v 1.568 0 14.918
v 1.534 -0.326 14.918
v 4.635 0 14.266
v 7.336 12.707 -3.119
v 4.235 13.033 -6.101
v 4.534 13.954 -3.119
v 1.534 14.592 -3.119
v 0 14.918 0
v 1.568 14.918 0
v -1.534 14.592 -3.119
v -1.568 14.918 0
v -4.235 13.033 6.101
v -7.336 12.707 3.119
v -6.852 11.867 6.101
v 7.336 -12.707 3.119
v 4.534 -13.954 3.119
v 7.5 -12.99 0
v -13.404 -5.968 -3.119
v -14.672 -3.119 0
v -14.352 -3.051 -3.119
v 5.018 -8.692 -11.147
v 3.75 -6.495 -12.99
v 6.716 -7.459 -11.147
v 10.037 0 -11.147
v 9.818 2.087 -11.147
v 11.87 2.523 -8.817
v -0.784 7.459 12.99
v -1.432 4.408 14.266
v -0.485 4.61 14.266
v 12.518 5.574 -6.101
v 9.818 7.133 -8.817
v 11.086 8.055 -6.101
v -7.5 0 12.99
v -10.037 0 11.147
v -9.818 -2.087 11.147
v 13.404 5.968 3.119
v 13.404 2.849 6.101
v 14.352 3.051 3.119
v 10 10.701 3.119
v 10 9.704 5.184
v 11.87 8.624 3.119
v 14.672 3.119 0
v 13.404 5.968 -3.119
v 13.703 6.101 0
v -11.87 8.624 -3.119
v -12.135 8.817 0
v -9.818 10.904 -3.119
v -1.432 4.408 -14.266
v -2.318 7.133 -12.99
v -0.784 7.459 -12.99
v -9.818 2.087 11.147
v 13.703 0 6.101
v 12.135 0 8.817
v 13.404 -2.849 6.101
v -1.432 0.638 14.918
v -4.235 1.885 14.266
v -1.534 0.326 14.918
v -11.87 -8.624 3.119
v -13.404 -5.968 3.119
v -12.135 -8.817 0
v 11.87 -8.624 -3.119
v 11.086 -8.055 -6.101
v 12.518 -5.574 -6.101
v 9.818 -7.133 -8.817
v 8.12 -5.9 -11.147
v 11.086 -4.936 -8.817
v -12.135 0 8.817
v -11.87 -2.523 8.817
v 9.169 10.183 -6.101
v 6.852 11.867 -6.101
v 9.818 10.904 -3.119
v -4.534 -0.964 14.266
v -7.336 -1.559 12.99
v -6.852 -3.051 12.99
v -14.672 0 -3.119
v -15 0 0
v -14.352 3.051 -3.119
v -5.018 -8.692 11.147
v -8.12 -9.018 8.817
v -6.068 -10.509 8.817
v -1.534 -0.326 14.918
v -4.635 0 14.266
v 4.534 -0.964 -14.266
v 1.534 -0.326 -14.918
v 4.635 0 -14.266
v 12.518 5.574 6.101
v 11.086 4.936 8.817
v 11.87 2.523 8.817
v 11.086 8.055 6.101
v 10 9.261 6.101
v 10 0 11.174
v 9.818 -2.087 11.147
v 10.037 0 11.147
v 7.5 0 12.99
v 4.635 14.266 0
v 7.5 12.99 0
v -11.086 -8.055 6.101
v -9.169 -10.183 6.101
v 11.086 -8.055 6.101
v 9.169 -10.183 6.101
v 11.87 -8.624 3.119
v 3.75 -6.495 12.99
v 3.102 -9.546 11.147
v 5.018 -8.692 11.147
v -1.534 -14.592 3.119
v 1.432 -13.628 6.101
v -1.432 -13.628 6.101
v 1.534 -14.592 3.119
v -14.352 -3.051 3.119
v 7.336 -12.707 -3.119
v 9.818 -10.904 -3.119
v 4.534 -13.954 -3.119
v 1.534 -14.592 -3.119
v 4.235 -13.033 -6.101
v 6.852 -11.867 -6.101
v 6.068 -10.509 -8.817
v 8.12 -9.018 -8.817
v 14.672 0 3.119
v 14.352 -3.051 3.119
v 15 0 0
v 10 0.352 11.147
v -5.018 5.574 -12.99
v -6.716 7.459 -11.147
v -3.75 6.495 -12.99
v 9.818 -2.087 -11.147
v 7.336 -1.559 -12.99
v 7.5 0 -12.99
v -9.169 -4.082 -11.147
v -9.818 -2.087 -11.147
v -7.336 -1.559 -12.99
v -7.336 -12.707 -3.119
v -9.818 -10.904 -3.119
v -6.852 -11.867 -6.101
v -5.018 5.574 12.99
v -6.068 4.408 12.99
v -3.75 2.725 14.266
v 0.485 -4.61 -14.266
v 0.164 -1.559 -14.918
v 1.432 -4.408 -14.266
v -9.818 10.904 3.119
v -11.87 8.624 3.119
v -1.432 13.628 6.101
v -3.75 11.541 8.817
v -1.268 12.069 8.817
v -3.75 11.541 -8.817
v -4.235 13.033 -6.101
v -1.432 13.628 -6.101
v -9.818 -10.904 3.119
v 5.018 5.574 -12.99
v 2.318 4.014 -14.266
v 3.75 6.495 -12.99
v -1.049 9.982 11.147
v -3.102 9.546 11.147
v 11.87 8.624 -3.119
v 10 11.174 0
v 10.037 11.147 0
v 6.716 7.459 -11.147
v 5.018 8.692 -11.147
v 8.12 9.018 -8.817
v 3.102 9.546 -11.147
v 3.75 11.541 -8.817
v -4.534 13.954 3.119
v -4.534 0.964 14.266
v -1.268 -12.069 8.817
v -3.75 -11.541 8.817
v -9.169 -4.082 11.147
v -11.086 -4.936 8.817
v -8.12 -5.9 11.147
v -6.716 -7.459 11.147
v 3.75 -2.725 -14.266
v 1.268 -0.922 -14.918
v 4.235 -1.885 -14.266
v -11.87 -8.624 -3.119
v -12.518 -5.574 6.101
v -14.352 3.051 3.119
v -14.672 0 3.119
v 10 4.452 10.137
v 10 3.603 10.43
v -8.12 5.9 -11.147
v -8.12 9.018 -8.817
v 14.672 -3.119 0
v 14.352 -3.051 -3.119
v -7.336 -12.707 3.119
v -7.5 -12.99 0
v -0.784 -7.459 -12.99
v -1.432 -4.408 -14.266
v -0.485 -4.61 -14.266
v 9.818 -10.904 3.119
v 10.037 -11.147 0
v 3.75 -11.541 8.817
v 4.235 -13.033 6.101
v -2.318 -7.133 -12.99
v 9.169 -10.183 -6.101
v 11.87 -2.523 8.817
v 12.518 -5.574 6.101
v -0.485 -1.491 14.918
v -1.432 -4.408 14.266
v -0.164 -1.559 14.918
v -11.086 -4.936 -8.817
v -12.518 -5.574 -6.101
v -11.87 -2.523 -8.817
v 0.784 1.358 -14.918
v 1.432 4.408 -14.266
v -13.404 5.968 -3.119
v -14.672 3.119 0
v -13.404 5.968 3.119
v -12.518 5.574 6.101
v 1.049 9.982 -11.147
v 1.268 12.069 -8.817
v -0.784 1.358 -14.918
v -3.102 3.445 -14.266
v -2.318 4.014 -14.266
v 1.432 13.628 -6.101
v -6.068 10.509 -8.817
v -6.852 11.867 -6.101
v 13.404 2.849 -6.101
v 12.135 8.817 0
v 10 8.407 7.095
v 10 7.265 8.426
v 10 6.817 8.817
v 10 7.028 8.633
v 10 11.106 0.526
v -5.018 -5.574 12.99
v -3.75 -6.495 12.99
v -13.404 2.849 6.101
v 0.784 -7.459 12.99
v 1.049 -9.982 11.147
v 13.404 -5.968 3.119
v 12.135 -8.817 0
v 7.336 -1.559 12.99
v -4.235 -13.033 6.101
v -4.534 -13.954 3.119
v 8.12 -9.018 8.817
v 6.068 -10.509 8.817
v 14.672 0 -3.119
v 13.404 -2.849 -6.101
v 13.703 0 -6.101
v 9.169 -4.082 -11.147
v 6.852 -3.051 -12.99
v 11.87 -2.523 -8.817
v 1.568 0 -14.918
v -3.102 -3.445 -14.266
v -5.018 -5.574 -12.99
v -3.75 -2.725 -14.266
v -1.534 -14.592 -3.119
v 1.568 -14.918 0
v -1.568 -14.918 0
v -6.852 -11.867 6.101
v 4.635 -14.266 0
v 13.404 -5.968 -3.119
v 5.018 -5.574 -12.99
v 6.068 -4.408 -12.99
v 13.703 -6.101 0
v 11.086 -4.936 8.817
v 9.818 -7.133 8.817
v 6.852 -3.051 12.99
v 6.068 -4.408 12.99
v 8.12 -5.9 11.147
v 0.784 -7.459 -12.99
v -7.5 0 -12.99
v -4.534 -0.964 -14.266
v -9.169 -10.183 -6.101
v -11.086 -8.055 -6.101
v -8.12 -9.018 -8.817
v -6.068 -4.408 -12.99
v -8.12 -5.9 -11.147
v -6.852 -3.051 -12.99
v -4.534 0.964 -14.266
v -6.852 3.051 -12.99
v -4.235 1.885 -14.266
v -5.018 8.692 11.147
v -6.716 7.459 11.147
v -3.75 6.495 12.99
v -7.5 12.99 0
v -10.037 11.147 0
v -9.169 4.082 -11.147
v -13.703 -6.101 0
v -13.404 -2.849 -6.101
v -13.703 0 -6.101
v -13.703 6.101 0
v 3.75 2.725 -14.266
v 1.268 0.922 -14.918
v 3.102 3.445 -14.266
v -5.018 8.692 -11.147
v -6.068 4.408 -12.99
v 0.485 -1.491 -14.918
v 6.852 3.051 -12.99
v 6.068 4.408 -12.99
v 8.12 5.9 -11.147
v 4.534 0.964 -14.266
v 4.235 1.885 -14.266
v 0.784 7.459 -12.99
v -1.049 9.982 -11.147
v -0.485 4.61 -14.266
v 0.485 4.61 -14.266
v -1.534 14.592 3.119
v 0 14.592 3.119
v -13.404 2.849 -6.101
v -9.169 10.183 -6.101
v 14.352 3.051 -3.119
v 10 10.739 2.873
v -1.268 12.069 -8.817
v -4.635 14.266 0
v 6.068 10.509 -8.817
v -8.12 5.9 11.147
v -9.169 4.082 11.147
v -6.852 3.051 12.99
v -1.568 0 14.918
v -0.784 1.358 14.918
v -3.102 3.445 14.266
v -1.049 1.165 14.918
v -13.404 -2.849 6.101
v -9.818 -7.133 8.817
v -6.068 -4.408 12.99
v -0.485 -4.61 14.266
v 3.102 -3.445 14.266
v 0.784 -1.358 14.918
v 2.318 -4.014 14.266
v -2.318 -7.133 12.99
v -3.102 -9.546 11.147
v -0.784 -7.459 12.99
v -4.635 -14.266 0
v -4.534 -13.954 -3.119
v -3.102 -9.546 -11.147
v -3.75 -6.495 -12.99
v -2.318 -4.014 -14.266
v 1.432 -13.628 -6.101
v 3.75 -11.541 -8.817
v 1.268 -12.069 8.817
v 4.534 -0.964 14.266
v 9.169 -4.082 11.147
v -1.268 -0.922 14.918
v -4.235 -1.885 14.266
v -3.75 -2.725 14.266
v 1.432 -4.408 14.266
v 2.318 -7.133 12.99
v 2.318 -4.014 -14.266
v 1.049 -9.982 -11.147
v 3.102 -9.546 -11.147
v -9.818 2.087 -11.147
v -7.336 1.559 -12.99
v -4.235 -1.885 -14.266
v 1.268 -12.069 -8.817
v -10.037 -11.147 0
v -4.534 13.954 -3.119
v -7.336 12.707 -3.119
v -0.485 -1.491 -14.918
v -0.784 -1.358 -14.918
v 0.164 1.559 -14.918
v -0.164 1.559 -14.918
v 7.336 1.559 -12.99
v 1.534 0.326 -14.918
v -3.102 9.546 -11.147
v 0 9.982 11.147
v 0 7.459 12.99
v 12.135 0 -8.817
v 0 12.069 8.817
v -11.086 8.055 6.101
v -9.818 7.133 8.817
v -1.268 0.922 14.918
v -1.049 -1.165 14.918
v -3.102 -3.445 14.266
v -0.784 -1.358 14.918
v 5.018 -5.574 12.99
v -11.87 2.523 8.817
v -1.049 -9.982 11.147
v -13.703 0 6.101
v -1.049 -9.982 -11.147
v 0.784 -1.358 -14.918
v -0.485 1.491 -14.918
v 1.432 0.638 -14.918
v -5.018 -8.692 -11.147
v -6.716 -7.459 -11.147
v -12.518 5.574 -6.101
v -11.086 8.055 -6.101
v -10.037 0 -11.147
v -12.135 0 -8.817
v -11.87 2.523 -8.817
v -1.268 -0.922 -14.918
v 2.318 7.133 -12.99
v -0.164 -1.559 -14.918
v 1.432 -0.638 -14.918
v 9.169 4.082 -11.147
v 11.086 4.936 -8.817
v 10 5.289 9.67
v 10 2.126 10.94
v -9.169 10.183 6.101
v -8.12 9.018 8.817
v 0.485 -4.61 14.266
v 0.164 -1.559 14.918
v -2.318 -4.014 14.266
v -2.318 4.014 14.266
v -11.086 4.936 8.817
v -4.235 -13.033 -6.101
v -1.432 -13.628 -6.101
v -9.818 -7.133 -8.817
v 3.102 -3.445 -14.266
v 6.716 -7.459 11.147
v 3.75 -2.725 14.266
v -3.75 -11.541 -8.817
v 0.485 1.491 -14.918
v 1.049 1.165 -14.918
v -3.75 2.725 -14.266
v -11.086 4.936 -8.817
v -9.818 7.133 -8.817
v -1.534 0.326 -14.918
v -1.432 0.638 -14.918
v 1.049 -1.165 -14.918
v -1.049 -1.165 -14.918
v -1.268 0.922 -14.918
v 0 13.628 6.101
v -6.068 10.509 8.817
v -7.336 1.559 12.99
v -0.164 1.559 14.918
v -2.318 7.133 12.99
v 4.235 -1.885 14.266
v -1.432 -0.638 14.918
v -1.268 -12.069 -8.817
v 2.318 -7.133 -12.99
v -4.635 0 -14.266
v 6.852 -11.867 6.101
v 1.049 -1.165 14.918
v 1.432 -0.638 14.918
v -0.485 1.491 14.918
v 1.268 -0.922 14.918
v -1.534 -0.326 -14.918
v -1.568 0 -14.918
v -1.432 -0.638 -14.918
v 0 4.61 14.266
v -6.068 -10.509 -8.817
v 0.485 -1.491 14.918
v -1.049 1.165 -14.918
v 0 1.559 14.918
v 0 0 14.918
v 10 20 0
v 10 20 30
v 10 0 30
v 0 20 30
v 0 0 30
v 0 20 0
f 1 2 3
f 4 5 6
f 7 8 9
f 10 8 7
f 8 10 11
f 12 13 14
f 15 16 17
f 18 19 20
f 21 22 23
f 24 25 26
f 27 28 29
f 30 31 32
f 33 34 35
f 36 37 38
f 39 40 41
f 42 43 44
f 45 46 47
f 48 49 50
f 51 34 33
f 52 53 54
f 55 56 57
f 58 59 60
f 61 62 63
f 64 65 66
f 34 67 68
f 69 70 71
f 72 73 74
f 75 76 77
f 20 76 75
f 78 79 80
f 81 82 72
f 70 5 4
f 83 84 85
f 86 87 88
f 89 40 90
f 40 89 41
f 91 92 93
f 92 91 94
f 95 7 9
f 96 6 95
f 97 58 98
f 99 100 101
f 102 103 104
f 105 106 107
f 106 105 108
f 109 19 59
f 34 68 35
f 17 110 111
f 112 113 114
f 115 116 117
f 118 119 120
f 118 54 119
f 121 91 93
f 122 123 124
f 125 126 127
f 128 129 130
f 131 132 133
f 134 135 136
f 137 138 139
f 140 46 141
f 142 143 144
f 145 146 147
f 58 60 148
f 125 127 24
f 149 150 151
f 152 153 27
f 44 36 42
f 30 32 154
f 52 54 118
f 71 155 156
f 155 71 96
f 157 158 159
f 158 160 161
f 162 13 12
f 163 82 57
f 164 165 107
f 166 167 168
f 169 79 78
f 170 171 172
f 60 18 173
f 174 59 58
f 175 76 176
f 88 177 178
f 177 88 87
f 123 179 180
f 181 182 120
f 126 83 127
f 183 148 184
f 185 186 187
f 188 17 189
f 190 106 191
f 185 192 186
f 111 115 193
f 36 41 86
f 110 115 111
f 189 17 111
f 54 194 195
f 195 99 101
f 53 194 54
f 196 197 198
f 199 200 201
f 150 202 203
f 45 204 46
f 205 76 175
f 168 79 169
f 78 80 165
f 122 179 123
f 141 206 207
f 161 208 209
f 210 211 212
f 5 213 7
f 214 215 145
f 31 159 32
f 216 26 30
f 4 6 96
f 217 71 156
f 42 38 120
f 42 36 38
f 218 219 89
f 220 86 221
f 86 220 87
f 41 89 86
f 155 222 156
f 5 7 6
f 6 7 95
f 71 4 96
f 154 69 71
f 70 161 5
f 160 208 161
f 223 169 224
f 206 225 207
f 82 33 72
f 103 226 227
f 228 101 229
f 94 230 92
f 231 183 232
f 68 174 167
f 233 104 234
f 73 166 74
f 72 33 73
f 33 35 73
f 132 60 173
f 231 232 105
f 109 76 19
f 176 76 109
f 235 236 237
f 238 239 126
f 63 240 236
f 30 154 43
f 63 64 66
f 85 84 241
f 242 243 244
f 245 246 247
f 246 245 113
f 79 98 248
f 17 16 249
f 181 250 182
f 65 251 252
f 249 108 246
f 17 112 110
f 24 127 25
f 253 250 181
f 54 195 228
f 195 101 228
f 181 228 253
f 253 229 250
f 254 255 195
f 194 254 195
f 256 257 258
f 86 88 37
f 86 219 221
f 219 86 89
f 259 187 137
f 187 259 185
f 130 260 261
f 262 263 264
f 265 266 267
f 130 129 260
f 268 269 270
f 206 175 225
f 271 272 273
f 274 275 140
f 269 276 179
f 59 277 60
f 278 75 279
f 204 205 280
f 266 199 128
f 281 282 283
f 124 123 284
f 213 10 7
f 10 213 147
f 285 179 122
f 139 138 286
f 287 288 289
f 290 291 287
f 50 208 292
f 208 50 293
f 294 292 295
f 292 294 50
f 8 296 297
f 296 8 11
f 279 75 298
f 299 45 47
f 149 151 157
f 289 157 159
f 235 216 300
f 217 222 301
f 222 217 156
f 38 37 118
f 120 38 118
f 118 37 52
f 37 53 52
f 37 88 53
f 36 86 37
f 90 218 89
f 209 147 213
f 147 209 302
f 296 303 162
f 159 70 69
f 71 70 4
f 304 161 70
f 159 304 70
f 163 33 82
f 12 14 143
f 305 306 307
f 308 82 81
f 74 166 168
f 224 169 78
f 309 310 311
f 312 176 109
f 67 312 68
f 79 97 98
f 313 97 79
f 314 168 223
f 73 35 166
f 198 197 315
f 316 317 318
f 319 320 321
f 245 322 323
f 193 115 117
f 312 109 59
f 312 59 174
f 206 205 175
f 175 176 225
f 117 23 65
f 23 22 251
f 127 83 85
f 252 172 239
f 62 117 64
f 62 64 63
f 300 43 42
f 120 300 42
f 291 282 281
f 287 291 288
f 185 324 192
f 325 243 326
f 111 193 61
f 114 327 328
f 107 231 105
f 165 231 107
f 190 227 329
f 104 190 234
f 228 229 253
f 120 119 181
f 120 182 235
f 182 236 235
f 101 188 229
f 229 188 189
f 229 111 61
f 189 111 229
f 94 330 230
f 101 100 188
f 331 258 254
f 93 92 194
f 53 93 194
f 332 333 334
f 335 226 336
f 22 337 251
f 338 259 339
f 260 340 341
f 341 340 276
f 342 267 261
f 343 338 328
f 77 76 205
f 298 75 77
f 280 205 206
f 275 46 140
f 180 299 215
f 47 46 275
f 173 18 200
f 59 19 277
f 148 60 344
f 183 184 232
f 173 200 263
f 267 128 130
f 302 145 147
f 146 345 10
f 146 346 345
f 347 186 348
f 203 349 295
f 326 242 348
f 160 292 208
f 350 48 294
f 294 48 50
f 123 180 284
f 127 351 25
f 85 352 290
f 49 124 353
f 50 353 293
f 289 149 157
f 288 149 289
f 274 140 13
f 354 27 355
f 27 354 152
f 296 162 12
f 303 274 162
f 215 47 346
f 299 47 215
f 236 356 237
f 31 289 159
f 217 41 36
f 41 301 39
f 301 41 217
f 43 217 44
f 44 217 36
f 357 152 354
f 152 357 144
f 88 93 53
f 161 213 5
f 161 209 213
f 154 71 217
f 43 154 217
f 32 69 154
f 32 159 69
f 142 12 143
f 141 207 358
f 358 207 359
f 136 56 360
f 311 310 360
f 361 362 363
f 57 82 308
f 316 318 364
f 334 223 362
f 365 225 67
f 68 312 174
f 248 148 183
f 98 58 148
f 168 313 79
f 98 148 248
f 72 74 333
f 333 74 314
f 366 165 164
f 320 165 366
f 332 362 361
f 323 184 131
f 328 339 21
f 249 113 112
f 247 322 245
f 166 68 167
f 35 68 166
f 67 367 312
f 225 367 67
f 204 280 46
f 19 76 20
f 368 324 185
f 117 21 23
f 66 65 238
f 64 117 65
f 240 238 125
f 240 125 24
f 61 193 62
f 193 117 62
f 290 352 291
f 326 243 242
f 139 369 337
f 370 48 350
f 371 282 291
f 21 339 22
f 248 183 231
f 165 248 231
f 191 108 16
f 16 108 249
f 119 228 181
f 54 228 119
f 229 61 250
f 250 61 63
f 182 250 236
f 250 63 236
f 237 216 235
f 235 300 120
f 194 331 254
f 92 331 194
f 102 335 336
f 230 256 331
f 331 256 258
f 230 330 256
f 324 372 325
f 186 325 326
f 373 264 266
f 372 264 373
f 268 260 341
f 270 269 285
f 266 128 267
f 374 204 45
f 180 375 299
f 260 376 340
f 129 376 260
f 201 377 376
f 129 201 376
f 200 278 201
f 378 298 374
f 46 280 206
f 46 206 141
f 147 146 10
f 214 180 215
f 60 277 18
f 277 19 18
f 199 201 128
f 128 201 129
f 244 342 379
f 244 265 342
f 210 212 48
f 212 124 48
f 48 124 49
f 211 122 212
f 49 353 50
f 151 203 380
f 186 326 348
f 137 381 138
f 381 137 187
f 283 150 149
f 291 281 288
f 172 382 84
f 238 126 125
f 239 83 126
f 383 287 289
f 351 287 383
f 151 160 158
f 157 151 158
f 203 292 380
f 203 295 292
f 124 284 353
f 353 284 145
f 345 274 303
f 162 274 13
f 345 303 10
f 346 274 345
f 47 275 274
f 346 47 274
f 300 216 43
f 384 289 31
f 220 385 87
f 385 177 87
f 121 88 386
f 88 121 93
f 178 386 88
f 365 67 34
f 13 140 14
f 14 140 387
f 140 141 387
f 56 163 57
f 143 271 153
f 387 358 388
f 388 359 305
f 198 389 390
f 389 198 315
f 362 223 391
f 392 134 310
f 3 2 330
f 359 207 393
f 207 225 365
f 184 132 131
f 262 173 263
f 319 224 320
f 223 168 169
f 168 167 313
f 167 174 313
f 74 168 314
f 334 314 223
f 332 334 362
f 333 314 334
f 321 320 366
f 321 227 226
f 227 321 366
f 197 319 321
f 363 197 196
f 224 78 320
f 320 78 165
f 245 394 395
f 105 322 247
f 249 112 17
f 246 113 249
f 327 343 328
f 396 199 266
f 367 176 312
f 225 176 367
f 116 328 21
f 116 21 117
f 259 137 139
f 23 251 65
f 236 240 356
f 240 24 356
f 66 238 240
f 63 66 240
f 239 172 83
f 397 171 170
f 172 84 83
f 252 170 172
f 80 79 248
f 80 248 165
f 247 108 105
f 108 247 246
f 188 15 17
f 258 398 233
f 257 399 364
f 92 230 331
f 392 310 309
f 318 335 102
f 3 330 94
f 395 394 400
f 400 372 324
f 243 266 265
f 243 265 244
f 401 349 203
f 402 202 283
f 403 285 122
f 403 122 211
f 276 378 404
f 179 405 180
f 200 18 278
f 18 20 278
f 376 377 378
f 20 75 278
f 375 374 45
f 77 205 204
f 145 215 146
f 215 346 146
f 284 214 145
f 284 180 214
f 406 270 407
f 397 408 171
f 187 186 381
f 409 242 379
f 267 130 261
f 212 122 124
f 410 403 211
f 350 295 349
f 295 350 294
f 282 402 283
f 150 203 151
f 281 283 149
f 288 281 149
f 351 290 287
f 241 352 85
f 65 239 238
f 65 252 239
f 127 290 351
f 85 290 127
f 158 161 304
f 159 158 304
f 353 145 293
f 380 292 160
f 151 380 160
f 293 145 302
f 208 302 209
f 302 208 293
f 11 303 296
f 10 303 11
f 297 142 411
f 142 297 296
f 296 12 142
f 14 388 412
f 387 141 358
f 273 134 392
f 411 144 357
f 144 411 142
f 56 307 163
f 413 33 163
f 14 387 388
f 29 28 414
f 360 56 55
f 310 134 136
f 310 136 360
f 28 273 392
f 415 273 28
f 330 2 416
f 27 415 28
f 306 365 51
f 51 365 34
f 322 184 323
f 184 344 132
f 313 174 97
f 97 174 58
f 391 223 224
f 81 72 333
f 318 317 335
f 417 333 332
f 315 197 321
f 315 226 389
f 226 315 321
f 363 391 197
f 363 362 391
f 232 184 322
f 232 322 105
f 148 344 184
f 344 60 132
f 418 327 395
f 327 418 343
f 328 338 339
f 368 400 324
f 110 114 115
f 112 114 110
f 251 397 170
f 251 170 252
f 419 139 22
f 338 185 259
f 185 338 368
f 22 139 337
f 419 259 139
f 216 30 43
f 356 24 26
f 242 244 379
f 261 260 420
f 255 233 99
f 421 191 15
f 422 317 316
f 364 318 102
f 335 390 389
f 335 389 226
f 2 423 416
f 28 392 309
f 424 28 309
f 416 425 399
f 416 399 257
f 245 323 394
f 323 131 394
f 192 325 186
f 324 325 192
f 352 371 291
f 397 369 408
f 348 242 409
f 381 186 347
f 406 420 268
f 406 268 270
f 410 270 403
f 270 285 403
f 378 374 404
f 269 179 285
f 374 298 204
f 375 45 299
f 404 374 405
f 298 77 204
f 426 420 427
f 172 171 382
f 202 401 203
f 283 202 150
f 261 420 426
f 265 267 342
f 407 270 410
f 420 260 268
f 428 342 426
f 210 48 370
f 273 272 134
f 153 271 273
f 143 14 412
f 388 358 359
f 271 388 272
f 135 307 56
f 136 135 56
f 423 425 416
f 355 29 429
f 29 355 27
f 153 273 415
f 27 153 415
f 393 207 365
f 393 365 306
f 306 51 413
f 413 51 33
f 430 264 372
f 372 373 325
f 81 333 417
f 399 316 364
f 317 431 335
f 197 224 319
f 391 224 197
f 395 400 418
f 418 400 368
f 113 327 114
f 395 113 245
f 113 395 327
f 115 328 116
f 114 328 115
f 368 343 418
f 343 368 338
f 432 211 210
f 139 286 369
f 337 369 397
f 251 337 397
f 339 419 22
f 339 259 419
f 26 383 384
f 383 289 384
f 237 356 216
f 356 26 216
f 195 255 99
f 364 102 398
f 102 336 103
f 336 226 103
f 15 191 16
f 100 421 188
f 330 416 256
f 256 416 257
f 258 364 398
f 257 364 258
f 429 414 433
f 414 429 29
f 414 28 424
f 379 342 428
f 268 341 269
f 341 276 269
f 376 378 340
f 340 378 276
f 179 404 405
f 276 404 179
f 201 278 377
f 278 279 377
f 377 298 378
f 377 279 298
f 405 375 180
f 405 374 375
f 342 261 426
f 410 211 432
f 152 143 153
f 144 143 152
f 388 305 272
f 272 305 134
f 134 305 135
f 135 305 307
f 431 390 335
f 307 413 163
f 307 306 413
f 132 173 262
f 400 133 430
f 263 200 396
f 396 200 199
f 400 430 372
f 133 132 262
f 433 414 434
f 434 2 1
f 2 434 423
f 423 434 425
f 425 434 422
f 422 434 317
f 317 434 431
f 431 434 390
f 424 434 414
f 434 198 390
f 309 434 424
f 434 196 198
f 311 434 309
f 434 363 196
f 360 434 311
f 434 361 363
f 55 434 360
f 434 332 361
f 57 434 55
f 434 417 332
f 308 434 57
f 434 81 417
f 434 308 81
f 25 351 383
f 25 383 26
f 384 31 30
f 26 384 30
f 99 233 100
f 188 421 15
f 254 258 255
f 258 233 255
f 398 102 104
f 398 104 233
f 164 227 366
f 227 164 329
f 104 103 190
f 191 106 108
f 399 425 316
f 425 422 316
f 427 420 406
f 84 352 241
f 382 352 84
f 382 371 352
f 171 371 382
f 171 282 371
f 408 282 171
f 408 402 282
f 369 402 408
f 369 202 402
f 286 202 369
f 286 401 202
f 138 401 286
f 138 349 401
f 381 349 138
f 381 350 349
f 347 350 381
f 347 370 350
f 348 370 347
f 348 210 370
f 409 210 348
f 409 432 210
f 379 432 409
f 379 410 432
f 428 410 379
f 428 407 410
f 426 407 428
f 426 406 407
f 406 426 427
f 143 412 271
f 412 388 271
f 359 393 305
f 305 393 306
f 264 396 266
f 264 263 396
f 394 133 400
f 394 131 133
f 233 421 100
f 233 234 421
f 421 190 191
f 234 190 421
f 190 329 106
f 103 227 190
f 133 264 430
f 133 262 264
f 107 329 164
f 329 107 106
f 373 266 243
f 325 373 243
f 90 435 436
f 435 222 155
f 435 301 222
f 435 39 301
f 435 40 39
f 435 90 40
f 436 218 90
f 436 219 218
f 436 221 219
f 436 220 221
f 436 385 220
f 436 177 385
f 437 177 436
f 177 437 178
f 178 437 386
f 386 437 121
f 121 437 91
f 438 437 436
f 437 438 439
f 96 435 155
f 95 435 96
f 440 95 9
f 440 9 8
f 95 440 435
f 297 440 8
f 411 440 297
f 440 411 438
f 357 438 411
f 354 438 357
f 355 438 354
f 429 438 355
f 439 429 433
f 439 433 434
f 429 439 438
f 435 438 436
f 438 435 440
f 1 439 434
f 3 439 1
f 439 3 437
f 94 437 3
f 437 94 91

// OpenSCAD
union() {
sphere(d=30);
cube(size=[10,20,30]);
}

/* <json>
*/
